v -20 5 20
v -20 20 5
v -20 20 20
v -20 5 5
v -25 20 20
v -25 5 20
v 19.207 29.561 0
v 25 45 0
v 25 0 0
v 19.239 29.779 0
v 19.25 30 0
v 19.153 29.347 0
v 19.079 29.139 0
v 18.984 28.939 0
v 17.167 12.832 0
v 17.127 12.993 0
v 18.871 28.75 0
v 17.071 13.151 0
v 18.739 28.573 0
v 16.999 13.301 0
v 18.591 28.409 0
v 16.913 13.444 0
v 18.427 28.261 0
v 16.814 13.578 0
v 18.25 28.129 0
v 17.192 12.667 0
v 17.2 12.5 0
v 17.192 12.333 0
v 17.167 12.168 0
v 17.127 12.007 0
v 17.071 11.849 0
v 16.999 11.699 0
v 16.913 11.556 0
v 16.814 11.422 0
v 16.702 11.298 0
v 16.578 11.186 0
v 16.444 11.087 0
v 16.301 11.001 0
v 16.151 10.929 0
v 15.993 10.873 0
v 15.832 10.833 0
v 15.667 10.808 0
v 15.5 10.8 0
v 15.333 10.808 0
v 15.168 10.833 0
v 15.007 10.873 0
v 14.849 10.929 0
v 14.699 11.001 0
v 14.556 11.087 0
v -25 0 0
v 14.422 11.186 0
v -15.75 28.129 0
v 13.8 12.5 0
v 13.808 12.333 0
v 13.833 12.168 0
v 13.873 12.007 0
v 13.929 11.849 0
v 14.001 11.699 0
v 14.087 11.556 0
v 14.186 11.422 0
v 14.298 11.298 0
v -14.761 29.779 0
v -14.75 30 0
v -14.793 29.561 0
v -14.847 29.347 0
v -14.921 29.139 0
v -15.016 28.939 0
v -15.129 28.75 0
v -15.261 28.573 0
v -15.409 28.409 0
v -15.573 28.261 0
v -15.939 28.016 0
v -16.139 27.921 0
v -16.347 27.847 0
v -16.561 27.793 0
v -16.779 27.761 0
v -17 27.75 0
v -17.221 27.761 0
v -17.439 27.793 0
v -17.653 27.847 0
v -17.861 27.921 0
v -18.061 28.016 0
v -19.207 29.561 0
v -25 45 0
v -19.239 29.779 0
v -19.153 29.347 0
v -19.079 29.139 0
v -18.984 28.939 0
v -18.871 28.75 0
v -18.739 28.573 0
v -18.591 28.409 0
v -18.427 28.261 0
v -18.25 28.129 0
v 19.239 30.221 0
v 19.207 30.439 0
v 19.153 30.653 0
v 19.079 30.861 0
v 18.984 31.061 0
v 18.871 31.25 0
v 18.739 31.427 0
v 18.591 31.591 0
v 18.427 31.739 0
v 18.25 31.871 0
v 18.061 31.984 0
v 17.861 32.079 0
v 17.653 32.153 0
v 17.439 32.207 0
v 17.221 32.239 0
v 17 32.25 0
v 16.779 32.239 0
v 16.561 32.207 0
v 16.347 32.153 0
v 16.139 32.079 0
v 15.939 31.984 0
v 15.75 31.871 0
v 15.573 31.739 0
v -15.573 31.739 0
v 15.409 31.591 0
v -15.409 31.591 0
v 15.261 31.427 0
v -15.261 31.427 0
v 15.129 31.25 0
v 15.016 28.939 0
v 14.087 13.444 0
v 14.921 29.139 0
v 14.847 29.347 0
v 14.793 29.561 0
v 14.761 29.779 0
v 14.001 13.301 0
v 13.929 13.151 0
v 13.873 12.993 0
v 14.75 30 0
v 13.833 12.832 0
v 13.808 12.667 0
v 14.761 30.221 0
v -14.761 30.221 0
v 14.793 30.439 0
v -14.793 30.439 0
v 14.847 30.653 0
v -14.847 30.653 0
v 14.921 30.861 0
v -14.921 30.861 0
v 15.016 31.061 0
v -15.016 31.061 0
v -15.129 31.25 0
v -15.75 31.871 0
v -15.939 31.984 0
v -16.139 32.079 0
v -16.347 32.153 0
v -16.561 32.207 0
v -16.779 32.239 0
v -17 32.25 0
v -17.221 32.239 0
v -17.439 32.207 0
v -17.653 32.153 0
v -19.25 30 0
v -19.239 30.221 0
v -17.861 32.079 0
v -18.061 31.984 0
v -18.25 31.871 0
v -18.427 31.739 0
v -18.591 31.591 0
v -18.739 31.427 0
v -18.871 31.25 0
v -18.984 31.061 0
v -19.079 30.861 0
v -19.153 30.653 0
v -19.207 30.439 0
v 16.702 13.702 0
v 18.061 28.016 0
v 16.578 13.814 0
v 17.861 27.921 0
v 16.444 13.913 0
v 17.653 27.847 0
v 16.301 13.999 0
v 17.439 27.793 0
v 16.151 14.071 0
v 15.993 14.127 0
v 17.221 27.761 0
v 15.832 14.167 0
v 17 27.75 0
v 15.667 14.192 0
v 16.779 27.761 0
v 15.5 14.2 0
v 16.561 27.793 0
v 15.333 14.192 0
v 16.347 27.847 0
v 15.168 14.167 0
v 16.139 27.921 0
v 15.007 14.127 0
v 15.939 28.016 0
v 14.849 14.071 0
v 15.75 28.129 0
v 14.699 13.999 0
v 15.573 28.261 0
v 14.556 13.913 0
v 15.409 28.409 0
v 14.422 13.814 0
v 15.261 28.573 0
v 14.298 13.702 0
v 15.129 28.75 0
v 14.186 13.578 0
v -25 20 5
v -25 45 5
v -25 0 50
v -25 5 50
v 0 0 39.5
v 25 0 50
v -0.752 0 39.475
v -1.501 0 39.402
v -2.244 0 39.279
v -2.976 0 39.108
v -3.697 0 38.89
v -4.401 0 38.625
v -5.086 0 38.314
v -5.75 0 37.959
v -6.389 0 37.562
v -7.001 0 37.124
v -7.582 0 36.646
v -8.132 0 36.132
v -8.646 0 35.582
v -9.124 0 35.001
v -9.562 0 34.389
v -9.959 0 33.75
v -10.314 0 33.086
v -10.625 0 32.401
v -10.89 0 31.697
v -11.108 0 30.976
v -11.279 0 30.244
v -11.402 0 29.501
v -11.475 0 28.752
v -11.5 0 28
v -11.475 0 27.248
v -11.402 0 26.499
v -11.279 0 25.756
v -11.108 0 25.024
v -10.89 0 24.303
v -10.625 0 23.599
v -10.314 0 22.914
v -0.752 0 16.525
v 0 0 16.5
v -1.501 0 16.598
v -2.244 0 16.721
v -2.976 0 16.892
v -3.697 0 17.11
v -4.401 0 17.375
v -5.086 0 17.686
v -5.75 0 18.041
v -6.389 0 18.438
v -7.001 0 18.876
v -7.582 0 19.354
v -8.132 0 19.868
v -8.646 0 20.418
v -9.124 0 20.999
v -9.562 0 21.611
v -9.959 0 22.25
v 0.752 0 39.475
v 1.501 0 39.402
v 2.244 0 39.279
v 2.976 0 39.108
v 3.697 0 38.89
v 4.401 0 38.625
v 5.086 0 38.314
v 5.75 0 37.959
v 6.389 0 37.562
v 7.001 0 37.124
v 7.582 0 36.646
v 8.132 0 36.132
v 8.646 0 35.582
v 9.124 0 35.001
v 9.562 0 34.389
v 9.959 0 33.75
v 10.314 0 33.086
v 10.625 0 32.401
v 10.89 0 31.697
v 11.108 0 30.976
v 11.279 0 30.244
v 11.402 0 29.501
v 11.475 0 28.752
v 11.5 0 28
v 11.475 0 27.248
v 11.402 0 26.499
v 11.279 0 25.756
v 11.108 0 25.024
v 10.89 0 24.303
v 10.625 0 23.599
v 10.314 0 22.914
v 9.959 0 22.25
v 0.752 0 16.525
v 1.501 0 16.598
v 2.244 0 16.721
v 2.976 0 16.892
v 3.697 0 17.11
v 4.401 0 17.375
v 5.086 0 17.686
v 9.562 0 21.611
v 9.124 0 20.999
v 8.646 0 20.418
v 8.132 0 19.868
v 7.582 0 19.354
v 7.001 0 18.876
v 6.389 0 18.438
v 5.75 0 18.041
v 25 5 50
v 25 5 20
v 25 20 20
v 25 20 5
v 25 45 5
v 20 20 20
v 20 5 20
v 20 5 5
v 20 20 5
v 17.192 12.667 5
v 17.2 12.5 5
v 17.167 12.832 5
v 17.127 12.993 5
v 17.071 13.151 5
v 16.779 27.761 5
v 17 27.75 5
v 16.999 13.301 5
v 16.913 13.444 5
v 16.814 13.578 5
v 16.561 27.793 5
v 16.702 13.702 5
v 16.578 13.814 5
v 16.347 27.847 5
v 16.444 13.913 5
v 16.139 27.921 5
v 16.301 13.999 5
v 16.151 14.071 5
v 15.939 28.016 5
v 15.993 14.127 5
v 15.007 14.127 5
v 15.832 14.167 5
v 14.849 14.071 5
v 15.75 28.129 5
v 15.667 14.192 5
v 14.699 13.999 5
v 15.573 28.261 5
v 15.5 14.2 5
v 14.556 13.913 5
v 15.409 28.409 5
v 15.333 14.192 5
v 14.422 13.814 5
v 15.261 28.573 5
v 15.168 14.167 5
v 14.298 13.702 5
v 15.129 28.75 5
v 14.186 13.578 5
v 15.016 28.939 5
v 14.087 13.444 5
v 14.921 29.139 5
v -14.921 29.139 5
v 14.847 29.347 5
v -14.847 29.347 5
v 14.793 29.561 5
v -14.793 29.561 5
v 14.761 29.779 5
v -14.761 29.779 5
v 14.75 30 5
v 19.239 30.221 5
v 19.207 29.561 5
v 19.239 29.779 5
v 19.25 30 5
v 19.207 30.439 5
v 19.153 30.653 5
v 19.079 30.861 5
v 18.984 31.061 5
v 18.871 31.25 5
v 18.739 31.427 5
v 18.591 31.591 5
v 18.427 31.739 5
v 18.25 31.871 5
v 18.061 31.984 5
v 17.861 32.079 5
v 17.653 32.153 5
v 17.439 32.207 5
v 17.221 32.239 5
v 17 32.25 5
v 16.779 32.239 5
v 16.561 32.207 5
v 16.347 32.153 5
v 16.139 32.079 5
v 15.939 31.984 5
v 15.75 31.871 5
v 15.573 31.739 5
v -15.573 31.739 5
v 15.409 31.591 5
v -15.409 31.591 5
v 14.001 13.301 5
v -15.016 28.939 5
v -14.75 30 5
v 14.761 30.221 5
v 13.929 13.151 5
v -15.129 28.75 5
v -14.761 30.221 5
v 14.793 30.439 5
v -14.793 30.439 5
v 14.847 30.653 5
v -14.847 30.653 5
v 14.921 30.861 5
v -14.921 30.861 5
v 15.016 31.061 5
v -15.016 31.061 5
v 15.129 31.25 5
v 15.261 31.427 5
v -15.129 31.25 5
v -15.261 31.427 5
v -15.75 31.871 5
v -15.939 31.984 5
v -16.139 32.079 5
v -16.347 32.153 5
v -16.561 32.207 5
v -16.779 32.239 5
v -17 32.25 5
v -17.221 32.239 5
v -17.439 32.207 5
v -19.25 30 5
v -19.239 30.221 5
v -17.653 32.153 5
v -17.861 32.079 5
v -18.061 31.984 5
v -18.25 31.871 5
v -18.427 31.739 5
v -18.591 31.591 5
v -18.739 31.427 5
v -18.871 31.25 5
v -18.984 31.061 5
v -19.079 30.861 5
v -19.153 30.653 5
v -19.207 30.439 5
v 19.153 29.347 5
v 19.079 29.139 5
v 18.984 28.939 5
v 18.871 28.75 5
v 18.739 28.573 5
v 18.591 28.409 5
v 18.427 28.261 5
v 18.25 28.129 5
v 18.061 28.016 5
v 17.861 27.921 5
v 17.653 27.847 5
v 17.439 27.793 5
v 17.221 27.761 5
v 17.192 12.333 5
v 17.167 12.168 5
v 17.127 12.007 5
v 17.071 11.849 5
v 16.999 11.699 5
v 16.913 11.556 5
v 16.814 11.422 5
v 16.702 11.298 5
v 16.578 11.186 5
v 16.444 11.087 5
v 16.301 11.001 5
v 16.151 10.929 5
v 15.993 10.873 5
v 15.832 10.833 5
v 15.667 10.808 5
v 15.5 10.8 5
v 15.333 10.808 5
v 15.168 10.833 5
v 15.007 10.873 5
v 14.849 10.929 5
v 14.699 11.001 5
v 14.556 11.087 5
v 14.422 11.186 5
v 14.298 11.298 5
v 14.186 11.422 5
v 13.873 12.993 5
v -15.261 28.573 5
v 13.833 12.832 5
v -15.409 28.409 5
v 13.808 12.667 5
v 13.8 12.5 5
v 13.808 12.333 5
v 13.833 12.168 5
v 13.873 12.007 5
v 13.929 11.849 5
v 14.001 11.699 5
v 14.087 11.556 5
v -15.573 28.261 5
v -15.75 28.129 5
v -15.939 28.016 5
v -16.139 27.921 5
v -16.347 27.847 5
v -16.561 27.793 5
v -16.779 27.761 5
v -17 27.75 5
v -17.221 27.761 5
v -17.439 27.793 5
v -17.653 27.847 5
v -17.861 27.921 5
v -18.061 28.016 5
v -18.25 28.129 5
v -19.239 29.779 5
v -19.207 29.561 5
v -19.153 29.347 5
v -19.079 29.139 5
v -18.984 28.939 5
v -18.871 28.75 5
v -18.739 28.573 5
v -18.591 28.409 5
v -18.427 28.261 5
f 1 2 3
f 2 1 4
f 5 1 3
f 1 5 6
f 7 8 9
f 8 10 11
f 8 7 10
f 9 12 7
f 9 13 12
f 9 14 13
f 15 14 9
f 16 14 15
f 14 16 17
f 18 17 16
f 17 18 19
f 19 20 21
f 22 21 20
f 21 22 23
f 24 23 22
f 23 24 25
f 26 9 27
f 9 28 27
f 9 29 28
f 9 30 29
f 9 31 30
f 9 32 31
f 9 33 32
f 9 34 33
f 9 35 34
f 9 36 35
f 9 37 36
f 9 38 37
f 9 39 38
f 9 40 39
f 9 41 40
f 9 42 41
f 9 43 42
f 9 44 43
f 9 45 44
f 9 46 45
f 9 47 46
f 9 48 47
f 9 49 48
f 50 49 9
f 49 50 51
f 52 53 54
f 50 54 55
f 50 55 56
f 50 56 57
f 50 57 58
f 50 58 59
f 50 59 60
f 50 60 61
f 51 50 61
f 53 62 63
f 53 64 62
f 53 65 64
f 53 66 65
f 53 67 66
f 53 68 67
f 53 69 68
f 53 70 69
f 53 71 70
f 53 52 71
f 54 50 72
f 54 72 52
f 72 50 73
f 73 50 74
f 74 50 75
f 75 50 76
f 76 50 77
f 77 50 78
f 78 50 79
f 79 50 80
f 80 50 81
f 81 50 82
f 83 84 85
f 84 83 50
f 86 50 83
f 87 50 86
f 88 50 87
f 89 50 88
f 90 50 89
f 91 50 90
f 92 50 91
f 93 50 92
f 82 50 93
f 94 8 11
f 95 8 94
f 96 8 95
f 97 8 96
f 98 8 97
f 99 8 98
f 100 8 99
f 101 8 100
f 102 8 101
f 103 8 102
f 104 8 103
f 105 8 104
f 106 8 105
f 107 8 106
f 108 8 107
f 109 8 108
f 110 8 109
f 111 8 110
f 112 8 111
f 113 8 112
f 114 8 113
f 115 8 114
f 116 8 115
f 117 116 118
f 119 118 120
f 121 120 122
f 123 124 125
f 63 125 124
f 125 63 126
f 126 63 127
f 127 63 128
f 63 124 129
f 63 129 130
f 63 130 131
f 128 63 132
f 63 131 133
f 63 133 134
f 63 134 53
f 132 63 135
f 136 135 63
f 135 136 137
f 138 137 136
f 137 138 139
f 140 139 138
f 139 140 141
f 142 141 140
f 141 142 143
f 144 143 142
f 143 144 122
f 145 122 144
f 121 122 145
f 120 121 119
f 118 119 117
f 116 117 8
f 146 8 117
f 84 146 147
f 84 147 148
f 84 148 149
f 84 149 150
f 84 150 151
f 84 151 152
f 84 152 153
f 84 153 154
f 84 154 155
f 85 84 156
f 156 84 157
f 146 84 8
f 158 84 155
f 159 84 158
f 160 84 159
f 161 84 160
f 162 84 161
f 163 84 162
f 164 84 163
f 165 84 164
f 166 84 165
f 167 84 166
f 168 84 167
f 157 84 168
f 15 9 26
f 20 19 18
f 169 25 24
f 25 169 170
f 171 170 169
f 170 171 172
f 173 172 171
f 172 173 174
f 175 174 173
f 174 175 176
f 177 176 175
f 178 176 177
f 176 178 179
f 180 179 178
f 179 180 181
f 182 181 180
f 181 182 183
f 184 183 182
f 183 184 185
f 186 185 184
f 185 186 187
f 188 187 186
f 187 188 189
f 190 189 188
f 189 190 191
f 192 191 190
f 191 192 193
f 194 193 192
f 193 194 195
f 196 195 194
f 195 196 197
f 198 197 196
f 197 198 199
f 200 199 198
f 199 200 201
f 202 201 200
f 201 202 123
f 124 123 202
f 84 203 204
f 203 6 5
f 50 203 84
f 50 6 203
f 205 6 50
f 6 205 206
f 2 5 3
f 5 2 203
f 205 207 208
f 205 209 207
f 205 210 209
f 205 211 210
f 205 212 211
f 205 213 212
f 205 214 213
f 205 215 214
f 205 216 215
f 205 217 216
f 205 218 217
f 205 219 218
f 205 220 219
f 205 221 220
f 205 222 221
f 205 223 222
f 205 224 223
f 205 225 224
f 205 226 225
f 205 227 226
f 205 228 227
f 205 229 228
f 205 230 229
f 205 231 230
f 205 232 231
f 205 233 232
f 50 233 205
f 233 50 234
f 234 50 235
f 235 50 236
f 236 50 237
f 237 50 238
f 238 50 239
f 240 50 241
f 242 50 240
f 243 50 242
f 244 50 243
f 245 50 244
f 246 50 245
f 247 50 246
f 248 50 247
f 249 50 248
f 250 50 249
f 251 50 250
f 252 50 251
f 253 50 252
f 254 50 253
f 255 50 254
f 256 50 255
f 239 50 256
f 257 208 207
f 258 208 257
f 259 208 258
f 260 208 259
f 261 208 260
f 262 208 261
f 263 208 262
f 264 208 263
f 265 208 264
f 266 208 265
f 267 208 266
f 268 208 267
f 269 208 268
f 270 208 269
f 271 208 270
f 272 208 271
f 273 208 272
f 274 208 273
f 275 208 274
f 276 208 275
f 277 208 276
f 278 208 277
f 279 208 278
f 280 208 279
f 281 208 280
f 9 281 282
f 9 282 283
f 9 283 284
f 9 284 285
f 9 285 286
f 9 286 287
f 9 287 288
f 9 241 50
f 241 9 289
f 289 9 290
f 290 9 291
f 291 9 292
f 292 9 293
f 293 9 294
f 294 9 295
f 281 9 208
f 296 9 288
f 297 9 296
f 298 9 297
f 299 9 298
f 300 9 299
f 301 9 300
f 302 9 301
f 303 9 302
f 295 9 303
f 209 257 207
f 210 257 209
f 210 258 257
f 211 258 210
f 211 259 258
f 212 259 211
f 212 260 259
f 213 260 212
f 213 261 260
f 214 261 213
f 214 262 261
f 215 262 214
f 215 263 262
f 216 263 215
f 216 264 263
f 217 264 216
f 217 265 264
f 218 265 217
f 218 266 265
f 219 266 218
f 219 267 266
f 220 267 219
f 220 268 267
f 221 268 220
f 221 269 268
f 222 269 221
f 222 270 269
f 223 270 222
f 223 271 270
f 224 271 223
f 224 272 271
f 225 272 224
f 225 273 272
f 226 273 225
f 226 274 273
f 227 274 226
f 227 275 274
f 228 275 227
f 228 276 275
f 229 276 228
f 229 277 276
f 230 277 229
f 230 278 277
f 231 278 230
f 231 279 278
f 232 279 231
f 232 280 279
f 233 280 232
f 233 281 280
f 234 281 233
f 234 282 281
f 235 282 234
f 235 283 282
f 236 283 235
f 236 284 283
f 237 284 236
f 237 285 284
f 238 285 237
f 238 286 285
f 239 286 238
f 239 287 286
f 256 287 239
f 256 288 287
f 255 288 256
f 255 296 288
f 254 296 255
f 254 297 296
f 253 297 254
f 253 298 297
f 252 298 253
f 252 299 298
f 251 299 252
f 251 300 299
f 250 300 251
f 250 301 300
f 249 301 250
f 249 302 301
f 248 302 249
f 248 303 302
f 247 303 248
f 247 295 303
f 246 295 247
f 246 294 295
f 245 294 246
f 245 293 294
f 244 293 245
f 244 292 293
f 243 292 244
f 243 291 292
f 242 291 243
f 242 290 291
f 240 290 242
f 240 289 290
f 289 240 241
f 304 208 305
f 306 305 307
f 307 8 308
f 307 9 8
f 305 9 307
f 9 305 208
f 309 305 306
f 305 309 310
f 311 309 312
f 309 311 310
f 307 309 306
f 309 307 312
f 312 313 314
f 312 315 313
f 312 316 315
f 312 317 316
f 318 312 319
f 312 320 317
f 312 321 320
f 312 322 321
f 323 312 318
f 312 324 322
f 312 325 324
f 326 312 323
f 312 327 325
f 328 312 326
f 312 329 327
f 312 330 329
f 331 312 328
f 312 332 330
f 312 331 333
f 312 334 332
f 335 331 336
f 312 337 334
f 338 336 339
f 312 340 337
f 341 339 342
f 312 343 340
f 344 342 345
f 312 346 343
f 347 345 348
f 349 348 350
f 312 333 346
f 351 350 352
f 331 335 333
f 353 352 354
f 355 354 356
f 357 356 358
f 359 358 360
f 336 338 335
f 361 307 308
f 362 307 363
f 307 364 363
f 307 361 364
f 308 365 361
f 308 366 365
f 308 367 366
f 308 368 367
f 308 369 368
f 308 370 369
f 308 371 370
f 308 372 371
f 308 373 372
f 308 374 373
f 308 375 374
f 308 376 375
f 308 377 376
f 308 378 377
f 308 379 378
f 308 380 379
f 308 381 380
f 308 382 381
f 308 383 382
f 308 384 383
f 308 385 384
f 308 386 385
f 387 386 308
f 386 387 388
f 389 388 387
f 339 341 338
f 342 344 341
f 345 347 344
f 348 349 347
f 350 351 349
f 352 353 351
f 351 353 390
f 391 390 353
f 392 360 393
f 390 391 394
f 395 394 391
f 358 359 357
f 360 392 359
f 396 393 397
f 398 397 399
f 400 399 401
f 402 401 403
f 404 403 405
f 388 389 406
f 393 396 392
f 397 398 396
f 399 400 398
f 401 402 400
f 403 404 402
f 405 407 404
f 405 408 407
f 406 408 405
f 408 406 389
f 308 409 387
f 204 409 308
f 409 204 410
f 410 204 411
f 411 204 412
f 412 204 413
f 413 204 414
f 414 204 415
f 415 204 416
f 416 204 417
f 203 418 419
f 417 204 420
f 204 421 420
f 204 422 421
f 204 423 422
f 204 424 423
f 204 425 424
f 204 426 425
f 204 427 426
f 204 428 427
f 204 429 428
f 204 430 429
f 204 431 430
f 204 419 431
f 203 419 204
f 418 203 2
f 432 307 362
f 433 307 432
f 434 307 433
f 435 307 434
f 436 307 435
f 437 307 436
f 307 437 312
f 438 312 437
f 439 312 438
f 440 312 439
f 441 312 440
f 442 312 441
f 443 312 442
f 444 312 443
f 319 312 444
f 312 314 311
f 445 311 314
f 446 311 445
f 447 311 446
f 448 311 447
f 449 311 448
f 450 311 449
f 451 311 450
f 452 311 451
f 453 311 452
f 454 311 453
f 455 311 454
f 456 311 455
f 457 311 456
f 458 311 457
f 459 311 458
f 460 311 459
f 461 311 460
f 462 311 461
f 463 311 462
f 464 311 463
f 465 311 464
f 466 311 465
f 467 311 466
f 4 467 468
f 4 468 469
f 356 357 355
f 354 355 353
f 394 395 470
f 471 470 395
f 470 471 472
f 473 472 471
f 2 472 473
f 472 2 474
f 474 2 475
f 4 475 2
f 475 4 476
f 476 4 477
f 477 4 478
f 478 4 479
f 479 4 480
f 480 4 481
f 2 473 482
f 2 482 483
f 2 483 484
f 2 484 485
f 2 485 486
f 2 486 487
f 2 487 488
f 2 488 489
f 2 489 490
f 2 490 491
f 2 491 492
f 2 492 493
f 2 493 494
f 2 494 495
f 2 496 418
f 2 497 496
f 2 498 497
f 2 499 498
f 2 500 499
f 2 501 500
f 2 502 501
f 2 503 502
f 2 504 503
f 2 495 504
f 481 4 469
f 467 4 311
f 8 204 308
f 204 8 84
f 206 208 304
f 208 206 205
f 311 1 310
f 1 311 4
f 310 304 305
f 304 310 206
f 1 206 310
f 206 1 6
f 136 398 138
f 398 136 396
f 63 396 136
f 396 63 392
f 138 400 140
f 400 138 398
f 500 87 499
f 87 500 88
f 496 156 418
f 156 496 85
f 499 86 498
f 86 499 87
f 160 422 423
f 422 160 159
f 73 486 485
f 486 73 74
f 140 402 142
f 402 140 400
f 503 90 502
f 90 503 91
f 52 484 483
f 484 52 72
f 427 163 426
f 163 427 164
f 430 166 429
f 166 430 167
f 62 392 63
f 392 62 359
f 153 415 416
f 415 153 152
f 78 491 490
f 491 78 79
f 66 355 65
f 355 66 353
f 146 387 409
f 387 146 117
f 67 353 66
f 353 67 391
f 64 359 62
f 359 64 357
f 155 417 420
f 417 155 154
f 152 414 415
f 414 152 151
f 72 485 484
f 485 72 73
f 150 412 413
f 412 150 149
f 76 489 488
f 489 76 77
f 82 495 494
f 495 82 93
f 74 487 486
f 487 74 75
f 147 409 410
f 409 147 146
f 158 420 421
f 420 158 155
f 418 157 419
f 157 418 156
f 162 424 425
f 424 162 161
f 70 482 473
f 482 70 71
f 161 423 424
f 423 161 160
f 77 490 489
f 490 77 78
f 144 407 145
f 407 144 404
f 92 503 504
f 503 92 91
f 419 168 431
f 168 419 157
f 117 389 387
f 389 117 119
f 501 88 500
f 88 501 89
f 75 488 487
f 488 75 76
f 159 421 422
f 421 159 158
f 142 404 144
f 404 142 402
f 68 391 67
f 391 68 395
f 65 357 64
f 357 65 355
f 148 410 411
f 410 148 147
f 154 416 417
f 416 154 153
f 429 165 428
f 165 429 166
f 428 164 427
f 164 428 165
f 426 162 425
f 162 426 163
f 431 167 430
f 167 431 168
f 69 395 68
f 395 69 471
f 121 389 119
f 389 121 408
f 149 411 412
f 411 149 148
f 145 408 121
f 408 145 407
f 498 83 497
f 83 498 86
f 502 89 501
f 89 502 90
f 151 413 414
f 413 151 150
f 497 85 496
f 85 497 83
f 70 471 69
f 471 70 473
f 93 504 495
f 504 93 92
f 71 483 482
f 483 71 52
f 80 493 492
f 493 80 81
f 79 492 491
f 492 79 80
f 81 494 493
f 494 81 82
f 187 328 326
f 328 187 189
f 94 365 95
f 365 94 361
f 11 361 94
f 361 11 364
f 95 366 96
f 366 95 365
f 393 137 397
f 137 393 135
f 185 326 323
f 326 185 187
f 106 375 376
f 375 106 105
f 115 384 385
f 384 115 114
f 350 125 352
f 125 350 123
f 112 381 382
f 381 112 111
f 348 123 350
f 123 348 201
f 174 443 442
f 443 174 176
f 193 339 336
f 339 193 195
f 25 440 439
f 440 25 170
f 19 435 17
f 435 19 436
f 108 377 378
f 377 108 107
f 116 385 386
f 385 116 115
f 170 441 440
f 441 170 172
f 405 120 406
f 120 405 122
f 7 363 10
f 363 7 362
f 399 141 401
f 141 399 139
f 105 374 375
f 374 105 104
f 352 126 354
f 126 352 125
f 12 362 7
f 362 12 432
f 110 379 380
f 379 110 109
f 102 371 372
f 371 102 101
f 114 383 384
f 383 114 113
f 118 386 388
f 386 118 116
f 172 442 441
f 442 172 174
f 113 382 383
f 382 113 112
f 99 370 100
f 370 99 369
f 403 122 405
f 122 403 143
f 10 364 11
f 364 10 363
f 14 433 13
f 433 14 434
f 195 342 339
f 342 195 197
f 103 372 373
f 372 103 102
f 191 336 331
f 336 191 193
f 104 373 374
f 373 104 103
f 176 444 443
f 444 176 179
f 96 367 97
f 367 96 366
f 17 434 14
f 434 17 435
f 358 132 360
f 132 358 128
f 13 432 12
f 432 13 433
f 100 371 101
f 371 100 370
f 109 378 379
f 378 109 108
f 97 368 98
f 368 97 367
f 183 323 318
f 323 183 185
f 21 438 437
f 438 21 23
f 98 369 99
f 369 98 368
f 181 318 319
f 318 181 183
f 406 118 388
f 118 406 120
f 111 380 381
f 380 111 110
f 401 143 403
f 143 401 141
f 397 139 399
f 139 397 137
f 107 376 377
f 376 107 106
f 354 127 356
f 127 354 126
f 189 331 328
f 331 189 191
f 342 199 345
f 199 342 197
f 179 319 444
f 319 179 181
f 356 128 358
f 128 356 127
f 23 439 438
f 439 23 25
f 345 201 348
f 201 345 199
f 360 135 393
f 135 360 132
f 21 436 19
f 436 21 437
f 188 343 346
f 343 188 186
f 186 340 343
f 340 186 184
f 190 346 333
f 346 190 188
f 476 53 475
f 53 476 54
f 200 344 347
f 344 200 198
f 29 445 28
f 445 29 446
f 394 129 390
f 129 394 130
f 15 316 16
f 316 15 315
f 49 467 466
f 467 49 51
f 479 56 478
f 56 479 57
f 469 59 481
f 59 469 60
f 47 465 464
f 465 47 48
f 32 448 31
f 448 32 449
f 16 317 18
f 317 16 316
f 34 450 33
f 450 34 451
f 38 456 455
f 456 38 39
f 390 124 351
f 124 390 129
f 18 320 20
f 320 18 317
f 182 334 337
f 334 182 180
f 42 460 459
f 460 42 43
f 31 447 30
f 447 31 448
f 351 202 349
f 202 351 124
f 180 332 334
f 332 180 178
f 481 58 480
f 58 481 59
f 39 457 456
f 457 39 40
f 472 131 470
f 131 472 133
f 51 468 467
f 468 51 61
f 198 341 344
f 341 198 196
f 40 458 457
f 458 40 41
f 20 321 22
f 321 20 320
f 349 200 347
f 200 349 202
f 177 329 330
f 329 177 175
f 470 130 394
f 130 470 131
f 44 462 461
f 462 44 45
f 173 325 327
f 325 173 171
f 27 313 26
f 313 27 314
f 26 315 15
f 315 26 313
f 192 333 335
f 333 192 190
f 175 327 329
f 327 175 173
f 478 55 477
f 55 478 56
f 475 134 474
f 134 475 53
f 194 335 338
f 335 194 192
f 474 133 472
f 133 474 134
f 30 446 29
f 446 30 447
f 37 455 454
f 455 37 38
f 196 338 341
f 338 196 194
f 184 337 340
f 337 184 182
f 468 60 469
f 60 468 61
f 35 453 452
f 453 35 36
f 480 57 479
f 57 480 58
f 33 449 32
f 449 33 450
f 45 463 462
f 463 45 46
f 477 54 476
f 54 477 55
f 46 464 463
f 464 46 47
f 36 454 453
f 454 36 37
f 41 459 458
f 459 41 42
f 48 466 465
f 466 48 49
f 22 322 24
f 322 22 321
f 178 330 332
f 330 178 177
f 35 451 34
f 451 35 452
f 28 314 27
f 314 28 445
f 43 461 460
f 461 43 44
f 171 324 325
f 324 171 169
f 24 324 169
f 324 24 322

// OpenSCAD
// L-shaped mounting bracket for NEMA 17 stepper motor
// Print orientation: base plate on bed, motor plate builds upward (+Z)

$fn = 64;

// ---- Base plate ----
base_x0 = -25; base_x1 = 25;   // X span 50
base_y0 = 0; base_y1 = 45;     // Y span 45
base_z0 = 0; base_z1 = 5;      // Z thickness 5
mount_hole_d = 4.5;            // M4 through-holes
mount_hole_x = [-17, 17];      // hole X positions
mount_hole_y = 30;             // hole Y position

// ---- Motor plate ----
motor_x0 = -25; motor_x1 = 25; // X span 50
motor_y0 = 0; motor_y1 = 5;    // Y span 5 (sits on back edge of base)
motor_z0 = 0; motor_z1 = 50;   // Z height 50

// ---- Boss hole (motor centring boss) ----
boss_d = 23;                   // hole diameter
boss_x = 0; boss_z = 28;       // hole centre

// ---- M3 screw holes on square pattern ----
screw_d = 3.4;                 // screw diameter
screw_s = 31;                  // square pattern side length
screw_h = 10;                  // depth into motor plate

// ---- Gussets ----
gusset_t = 5;                  // thickness along X
gusset_w = 20;                 // leg along +Y
gusset_h = 20;                 // leg along +Z
gusset_x0 = -25; gusset_x1 = -20; // left gusset X range
gusset_x2 = 20; gusset_x3 = 25;  // right gusset X range

// ---- Cutting overlap ----
eps = 0.5;                     // extension past cut faces

difference() {
    union() {
        // Base plate
        translate([base_x0, base_y0, base_z0])
            cube([base_x1 - base_x0, base_y1 - base_y0, base_z1 - base_z0]);

        // Motor plate
        translate([motor_x0, motor_y0, motor_z0])
            cube([motor_x1 - motor_x0, motor_y1 - motor_y0, motor_z1 - motor_z0]);

        // Gussets (right-angle corner at y = 5, z = 5)
        for (sx = [gusset_x0, gusset_x2])
            translate([sx, 0, 0])
                cube([gusset_t, gusset_w, gusset_h]);
    }

    // Base plate through-holes
    for (x = mount_hole_x)
        translate([x, mount_hole_y, -eps])
            cylinder(d = mount_hole_d, h = base_z1 + 2 * eps);

    // Boss hole
    translate([boss_x, 0, boss_z])
        rotate([90, 0, 0])
            cylinder(d = boss_d, h = motor_y1 - motor_y0 + eps, $fn = 96);

    // Screw holes
    for (i = [0 : 3]) {
        a = (i < 2) ? 0 : 90;
        translate([boss_x - screw_s / 2 + (i < 2 ? 0 : screw_s),
                   boss_z - screw_s / 2 + (i >= 2 ? 0 : -screw_s)])
            rotate([0, 0, a])
                cylinder(d = screw_d, h = screw_h + eps);
    }
}
